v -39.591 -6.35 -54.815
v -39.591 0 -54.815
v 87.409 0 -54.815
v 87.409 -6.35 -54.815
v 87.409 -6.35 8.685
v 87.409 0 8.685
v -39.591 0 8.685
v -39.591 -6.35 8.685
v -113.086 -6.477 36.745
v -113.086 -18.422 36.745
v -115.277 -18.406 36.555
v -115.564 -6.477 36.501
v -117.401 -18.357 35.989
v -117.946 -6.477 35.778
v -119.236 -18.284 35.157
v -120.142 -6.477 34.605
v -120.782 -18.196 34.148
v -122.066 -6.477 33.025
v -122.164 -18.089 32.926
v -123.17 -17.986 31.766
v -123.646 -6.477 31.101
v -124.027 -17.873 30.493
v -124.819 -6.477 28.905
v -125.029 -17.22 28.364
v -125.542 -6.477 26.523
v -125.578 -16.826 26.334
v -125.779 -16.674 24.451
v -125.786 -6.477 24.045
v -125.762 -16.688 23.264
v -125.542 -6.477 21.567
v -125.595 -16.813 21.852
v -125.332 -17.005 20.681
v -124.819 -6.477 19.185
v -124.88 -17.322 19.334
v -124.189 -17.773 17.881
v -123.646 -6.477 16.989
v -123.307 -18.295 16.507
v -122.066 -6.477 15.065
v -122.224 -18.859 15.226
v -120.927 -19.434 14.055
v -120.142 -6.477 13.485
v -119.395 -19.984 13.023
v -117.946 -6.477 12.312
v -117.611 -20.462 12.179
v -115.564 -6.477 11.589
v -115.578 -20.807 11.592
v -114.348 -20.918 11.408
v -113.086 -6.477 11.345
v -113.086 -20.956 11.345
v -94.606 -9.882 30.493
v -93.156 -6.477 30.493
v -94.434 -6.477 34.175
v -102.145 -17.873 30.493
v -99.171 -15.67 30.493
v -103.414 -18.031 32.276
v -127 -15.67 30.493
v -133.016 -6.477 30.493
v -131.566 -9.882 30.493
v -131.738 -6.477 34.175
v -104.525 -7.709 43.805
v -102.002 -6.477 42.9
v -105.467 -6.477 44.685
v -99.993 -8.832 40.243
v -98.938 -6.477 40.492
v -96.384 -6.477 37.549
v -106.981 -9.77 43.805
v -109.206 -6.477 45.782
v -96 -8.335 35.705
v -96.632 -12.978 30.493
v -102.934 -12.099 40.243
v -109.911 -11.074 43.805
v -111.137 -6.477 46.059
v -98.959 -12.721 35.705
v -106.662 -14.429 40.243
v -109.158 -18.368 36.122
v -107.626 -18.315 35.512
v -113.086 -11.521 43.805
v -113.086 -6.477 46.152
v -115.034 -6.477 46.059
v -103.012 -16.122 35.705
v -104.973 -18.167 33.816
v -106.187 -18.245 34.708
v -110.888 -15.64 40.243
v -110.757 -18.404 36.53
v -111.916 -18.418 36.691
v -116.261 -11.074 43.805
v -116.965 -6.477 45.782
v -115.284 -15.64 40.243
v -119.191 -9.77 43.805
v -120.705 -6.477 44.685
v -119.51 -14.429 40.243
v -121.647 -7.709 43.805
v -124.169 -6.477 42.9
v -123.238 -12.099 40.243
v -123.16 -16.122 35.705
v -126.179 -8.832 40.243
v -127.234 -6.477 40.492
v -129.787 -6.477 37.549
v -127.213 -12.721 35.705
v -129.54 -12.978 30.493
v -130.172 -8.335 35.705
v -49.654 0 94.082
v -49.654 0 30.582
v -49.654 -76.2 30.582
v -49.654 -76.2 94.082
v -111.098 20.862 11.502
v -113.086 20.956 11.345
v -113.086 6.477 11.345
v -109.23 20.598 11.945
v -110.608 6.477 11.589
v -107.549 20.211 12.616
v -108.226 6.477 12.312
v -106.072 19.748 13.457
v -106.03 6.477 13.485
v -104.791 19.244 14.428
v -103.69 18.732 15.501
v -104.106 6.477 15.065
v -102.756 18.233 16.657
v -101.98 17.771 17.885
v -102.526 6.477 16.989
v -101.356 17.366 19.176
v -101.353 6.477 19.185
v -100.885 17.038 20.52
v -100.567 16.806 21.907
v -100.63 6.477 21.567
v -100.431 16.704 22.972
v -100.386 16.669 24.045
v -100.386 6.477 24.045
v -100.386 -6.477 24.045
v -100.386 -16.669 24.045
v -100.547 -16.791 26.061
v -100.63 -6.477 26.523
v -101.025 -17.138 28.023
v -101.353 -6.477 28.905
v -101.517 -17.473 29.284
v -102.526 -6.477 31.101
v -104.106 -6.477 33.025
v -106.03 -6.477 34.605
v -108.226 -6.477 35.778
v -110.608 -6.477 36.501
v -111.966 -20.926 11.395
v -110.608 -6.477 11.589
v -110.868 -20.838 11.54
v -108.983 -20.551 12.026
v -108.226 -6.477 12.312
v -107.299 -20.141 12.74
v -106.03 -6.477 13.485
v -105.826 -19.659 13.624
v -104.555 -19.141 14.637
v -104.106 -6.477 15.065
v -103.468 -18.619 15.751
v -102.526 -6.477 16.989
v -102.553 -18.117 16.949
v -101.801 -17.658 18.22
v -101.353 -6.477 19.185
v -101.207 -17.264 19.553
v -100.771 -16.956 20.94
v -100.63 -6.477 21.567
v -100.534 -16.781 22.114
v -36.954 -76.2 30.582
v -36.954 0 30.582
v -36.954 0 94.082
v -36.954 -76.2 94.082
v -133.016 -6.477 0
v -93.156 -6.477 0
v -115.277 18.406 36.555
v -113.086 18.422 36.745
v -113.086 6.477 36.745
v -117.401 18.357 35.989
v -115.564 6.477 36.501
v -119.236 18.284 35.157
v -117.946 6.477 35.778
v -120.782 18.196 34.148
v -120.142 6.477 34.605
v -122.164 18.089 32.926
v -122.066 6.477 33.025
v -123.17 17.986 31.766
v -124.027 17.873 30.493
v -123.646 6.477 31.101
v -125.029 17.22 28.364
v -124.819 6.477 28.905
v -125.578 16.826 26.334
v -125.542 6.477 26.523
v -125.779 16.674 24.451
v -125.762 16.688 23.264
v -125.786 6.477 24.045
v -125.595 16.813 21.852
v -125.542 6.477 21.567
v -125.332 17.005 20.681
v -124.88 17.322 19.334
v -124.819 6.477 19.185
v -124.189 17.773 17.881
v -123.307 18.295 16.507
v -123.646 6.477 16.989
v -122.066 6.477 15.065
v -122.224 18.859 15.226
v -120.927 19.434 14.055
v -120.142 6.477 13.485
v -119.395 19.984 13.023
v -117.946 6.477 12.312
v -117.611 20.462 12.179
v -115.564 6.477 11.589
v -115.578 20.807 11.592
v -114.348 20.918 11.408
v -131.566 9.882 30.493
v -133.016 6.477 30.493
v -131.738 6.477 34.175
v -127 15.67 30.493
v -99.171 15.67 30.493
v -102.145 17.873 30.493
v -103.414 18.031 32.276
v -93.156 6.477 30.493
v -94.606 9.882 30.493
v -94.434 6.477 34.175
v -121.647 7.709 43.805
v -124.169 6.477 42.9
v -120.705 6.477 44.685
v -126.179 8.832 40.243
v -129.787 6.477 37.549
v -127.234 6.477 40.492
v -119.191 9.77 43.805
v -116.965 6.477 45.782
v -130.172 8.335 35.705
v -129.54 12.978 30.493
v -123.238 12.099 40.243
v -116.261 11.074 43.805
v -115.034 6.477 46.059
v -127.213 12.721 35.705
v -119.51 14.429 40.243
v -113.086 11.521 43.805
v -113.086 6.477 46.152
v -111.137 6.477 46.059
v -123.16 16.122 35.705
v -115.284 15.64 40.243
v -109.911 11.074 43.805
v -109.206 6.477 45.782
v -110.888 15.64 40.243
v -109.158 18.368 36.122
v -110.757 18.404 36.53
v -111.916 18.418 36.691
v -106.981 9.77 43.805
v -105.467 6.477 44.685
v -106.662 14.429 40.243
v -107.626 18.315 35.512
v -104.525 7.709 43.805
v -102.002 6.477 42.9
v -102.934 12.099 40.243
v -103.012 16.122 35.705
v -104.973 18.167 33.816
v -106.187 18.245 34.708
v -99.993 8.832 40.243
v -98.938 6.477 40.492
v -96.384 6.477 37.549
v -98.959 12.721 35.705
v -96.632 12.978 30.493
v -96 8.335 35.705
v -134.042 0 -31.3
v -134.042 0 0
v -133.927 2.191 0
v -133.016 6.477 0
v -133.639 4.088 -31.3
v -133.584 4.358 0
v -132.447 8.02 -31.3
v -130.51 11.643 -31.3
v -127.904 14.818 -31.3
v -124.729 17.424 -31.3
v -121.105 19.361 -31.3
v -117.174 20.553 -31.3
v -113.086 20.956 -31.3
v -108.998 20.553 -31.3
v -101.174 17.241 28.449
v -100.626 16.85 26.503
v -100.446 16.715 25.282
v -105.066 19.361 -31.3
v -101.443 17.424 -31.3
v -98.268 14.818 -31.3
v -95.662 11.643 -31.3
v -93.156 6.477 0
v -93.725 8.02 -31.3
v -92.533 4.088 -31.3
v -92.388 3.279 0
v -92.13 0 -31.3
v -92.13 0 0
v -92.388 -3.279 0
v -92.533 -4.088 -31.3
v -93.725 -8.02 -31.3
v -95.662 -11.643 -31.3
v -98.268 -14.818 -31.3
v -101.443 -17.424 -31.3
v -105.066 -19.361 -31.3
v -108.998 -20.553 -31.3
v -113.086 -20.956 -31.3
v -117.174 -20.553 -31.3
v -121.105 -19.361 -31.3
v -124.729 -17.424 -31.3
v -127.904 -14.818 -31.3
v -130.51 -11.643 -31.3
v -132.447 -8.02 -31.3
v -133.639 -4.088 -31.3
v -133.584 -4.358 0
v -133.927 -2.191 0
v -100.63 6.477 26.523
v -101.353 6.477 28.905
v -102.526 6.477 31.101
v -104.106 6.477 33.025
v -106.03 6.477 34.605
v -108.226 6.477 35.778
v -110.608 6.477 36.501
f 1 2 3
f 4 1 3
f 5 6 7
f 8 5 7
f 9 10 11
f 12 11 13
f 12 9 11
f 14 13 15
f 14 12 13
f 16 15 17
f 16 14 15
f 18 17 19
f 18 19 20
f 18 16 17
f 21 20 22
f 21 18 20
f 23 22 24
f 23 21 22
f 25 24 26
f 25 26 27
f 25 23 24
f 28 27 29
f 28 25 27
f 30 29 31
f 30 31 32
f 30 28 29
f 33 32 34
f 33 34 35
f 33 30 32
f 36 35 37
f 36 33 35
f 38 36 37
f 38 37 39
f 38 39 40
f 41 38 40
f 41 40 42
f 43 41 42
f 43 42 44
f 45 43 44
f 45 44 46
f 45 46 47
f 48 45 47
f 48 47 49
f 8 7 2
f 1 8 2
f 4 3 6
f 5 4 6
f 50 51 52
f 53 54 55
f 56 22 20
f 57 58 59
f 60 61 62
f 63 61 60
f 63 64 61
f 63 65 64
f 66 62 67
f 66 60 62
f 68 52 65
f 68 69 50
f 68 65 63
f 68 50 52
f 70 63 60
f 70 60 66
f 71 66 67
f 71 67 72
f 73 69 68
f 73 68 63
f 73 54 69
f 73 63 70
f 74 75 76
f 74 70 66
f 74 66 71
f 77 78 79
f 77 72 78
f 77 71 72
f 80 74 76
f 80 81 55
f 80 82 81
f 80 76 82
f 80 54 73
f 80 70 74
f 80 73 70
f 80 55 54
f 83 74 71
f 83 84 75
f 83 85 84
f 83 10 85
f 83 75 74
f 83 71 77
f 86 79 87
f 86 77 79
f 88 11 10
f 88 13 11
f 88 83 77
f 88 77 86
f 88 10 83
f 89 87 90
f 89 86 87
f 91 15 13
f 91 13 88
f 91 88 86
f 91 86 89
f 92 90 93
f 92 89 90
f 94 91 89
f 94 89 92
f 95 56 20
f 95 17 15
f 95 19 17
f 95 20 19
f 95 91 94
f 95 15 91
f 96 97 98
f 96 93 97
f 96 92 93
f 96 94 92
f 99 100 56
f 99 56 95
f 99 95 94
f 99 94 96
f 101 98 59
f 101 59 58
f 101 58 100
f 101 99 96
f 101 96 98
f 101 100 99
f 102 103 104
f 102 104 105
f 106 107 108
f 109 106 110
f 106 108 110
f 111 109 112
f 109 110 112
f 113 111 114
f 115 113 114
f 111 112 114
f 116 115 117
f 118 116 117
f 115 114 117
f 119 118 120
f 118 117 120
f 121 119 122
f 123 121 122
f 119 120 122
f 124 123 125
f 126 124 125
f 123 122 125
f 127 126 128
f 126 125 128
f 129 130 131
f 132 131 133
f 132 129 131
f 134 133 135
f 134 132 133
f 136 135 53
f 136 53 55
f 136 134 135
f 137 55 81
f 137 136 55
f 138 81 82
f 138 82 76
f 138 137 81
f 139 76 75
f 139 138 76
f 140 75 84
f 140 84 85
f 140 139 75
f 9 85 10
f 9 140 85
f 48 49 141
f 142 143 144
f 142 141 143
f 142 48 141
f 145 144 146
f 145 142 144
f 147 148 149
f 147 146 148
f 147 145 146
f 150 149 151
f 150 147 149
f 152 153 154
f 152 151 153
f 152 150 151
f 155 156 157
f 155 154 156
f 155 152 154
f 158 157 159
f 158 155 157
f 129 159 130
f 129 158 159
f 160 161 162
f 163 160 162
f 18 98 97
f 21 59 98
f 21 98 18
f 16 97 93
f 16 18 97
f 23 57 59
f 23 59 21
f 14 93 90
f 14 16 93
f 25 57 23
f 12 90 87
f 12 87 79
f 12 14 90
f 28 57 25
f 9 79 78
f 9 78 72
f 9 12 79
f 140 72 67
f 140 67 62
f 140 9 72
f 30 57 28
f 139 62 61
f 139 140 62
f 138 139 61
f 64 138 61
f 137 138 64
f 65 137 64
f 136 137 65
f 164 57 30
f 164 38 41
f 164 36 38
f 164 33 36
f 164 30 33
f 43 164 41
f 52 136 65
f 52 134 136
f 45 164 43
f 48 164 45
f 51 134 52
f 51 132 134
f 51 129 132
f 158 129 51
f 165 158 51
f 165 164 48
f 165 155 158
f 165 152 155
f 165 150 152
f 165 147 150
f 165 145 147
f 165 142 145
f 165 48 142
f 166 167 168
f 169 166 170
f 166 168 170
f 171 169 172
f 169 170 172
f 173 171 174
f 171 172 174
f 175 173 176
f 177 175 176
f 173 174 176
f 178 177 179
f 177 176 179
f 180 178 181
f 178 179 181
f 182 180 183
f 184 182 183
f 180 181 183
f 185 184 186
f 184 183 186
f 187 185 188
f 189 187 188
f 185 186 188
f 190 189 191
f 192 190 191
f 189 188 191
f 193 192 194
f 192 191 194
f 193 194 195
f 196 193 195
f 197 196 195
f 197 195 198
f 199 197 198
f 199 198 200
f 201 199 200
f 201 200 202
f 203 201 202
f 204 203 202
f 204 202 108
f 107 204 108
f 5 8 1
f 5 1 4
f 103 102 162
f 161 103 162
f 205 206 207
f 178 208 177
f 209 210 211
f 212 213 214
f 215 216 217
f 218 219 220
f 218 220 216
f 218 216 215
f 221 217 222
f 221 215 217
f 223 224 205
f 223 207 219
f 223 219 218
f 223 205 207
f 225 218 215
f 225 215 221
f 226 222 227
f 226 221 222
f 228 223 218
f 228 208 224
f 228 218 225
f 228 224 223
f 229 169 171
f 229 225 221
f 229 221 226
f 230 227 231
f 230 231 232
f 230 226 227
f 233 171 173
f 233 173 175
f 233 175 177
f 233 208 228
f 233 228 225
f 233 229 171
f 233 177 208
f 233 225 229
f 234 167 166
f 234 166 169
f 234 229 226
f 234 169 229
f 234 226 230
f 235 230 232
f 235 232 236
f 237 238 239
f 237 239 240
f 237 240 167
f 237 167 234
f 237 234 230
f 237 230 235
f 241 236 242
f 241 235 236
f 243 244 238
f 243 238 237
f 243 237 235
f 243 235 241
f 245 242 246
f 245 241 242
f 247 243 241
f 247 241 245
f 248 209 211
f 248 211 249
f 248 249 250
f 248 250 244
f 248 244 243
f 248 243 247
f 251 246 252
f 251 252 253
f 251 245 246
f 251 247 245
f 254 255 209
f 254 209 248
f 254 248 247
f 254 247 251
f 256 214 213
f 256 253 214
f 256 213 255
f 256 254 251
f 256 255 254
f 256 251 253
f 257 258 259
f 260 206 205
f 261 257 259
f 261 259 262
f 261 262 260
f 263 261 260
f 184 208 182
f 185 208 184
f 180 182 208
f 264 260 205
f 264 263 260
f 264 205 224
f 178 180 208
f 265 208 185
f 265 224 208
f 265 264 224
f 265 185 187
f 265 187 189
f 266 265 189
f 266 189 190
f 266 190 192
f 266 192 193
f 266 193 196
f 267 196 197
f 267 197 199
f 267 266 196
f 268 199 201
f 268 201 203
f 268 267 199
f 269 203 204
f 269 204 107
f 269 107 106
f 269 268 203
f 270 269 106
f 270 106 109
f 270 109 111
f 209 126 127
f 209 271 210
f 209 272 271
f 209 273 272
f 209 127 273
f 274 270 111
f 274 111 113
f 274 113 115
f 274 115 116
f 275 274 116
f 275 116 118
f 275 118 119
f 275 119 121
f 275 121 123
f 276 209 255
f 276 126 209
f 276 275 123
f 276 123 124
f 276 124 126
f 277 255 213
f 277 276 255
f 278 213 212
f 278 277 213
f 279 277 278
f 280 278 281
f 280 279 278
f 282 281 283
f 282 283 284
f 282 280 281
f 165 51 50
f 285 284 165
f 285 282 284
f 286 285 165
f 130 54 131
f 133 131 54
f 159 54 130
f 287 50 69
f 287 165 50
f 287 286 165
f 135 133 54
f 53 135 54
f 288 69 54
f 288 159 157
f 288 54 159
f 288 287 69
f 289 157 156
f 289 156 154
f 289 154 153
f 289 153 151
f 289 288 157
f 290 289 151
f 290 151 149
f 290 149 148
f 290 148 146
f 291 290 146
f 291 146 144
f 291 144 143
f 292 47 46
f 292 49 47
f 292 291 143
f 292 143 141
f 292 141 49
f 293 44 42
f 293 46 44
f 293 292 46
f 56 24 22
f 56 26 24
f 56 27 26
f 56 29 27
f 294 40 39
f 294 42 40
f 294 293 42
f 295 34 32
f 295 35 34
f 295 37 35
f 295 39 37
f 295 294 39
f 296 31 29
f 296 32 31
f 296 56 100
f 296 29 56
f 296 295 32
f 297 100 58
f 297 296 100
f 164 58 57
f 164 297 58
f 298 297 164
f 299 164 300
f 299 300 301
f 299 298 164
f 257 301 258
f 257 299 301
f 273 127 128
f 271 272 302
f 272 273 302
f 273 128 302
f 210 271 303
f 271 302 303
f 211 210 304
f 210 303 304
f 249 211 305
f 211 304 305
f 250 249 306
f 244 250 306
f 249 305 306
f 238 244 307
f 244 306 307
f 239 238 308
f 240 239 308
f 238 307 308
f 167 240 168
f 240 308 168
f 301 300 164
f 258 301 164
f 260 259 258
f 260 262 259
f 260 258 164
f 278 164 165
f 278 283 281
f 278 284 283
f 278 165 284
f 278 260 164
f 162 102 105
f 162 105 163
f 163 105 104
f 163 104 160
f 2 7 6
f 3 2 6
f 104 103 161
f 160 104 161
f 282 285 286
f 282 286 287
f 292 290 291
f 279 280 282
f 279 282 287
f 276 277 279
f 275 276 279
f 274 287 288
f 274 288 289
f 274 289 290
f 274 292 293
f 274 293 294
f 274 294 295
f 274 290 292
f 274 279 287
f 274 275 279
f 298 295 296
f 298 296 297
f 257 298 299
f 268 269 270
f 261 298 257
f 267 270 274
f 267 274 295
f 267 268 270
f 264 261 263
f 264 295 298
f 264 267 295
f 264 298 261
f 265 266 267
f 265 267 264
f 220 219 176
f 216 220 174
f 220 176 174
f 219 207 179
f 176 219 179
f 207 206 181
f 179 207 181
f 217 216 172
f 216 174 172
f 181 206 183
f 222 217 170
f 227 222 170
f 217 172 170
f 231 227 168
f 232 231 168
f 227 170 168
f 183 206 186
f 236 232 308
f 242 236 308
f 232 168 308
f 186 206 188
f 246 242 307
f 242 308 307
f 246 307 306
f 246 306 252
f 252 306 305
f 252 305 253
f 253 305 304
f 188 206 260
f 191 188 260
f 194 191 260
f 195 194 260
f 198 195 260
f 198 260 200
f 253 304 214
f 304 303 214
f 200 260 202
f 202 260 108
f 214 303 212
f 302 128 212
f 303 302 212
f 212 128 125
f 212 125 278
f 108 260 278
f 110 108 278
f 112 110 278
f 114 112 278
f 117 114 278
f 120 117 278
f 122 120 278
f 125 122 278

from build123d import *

# Parameters (mm, degrees)
F1_DEPTH = 6.35
F0_W     = 12.7
F0_H     = 63.5
F2_DEPTH = 76.2
F4_DEPTH = 20.9570915828
F5_DEPTH = 25.4
F6_W     = 41.9121831656
F6_H     = 12.954
F7_DEPTH = 78.4056


# Not quite as in the source:
# - a feature names something its author has since deleted; it is built from what else it names


with BuildPart() as f1:
    # F0 (on Front) → F1 (new body)
    with BuildSketch(Plane.XZ):
        Polygon((-32.8281914331, 8.6850252382), (-39.5913863666, 8.6850252382), (-39.5913863666, -54.8149747618), (-32.8281914331, -54.8149747618), (17.9718085669, -54.8149747618), (87.4086136334, -54.8149747618), (87.4086136334, 8.6850252382), (17.9718085669, 8.6850252382), align=None)
    extrude(amount=F1_DEPTH)


with BuildPart() as f2:
    # F0 (on Front) → F2 (new body)
    with BuildSketch(Plane.XZ):
        with Locations((-43.3035971761, 62.3321020156)):
            Rectangle(F0_W, F0_H)
    extrude(amount=F2_DEPTH)


with BuildPart() as f3:
    # F0 (on Front) → F3 (revolve)
    with BuildSketch(Plane.XZ):
        with BuildLine():
            ThreePointArc((-113.0859330297, 11.3450873971), (-125.7859330297, 24.0450873971), (-113.0859330297, 36.7450873971))
            Line((-113.0859330297, 36.7450873971), (-113.0859330297, 47.1505224705))
            ThreePointArc((-113.0859330297, 47.1505224705), (-126.4708775994, 42.47888537), (-134.0420246124, 30.4931160063))
            Line((-134.0420246124, 30.4931160063), (-134.0420246124, -31.3004925847))
            Line((-134.0420246124, -31.3004925847), (-113.0859330297, -31.3004925847))
            Line((-113.0859330297, -31.3004925847), (-113.0859330297, 11.3450873971))
        make_face()
        with BuildLine():
            ThreePointArc((-113.0859330297, 11.3450873971), (-104.1056769086, 15.064831276), (-100.3859330297, 24.0450873971))
            ThreePointArc((-100.3859330297, 24.0450873971), (-104.1056769086, 33.0253435182), (-113.0859330297, 36.7450873971))
            ThreePointArc((-113.0859330297, 36.7450873971), (-125.7859330297, 24.0450873971), (-113.0859330297, 11.3450873971))
        make_face()
    revolve(axis=Axis((-113.0859330297, 0, -9.9777025938), (0, 0, -1)))

    # F0 (on Front) → F4 (cut, through all)
    with BuildSketch(Plane.XZ):
        with BuildLine():
            ThreePointArc((-113.0859330297, 11.3450873971), (-104.1056769086, 15.064831276), (-100.3859330297, 24.0450873971))
            ThreePointArc((-100.3859330297, 24.0450873971), (-104.1056769086, 33.0253435182), (-113.0859330297, 36.7450873971))
            ThreePointArc((-113.0859330297, 36.7450873971), (-125.7859330297, 24.0450873971), (-113.0859330297, 11.3450873971))
        make_face()
    extrude(amount=-F4_DEPTH, mode=Mode.SUBTRACT)

    # F0 (on Front) → F5 (cut)
    with BuildSketch(Plane.XZ):
        with BuildLine():
            ThreePointArc((-113.0859330297, 11.3450873971), (-104.1056769086, 15.064831276), (-100.3859330297, 24.0450873971))
            ThreePointArc((-100.3859330297, 24.0450873971), (-104.1056769086, 33.0253435182), (-113.0859330297, 36.7450873971))
            ThreePointArc((-113.0859330297, 36.7450873971), (-125.7859330297, 24.0450873971), (-113.0859330297, 11.3450873971))
        make_face()
    extrude(amount=F5_DEPTH, mode=Mode.SUBTRACT)

    # F6 (on Top) → F7 (cut)
    with BuildSketch(Plane.XY):
        with Locations((-113.0859330297, 0)):
            Rectangle(F6_W, F6_H)
    extrude(amount=F7_DEPTH, mode=Mode.SUBTRACT)


solid = Compound([f1.part, f2.part, f3.part])
